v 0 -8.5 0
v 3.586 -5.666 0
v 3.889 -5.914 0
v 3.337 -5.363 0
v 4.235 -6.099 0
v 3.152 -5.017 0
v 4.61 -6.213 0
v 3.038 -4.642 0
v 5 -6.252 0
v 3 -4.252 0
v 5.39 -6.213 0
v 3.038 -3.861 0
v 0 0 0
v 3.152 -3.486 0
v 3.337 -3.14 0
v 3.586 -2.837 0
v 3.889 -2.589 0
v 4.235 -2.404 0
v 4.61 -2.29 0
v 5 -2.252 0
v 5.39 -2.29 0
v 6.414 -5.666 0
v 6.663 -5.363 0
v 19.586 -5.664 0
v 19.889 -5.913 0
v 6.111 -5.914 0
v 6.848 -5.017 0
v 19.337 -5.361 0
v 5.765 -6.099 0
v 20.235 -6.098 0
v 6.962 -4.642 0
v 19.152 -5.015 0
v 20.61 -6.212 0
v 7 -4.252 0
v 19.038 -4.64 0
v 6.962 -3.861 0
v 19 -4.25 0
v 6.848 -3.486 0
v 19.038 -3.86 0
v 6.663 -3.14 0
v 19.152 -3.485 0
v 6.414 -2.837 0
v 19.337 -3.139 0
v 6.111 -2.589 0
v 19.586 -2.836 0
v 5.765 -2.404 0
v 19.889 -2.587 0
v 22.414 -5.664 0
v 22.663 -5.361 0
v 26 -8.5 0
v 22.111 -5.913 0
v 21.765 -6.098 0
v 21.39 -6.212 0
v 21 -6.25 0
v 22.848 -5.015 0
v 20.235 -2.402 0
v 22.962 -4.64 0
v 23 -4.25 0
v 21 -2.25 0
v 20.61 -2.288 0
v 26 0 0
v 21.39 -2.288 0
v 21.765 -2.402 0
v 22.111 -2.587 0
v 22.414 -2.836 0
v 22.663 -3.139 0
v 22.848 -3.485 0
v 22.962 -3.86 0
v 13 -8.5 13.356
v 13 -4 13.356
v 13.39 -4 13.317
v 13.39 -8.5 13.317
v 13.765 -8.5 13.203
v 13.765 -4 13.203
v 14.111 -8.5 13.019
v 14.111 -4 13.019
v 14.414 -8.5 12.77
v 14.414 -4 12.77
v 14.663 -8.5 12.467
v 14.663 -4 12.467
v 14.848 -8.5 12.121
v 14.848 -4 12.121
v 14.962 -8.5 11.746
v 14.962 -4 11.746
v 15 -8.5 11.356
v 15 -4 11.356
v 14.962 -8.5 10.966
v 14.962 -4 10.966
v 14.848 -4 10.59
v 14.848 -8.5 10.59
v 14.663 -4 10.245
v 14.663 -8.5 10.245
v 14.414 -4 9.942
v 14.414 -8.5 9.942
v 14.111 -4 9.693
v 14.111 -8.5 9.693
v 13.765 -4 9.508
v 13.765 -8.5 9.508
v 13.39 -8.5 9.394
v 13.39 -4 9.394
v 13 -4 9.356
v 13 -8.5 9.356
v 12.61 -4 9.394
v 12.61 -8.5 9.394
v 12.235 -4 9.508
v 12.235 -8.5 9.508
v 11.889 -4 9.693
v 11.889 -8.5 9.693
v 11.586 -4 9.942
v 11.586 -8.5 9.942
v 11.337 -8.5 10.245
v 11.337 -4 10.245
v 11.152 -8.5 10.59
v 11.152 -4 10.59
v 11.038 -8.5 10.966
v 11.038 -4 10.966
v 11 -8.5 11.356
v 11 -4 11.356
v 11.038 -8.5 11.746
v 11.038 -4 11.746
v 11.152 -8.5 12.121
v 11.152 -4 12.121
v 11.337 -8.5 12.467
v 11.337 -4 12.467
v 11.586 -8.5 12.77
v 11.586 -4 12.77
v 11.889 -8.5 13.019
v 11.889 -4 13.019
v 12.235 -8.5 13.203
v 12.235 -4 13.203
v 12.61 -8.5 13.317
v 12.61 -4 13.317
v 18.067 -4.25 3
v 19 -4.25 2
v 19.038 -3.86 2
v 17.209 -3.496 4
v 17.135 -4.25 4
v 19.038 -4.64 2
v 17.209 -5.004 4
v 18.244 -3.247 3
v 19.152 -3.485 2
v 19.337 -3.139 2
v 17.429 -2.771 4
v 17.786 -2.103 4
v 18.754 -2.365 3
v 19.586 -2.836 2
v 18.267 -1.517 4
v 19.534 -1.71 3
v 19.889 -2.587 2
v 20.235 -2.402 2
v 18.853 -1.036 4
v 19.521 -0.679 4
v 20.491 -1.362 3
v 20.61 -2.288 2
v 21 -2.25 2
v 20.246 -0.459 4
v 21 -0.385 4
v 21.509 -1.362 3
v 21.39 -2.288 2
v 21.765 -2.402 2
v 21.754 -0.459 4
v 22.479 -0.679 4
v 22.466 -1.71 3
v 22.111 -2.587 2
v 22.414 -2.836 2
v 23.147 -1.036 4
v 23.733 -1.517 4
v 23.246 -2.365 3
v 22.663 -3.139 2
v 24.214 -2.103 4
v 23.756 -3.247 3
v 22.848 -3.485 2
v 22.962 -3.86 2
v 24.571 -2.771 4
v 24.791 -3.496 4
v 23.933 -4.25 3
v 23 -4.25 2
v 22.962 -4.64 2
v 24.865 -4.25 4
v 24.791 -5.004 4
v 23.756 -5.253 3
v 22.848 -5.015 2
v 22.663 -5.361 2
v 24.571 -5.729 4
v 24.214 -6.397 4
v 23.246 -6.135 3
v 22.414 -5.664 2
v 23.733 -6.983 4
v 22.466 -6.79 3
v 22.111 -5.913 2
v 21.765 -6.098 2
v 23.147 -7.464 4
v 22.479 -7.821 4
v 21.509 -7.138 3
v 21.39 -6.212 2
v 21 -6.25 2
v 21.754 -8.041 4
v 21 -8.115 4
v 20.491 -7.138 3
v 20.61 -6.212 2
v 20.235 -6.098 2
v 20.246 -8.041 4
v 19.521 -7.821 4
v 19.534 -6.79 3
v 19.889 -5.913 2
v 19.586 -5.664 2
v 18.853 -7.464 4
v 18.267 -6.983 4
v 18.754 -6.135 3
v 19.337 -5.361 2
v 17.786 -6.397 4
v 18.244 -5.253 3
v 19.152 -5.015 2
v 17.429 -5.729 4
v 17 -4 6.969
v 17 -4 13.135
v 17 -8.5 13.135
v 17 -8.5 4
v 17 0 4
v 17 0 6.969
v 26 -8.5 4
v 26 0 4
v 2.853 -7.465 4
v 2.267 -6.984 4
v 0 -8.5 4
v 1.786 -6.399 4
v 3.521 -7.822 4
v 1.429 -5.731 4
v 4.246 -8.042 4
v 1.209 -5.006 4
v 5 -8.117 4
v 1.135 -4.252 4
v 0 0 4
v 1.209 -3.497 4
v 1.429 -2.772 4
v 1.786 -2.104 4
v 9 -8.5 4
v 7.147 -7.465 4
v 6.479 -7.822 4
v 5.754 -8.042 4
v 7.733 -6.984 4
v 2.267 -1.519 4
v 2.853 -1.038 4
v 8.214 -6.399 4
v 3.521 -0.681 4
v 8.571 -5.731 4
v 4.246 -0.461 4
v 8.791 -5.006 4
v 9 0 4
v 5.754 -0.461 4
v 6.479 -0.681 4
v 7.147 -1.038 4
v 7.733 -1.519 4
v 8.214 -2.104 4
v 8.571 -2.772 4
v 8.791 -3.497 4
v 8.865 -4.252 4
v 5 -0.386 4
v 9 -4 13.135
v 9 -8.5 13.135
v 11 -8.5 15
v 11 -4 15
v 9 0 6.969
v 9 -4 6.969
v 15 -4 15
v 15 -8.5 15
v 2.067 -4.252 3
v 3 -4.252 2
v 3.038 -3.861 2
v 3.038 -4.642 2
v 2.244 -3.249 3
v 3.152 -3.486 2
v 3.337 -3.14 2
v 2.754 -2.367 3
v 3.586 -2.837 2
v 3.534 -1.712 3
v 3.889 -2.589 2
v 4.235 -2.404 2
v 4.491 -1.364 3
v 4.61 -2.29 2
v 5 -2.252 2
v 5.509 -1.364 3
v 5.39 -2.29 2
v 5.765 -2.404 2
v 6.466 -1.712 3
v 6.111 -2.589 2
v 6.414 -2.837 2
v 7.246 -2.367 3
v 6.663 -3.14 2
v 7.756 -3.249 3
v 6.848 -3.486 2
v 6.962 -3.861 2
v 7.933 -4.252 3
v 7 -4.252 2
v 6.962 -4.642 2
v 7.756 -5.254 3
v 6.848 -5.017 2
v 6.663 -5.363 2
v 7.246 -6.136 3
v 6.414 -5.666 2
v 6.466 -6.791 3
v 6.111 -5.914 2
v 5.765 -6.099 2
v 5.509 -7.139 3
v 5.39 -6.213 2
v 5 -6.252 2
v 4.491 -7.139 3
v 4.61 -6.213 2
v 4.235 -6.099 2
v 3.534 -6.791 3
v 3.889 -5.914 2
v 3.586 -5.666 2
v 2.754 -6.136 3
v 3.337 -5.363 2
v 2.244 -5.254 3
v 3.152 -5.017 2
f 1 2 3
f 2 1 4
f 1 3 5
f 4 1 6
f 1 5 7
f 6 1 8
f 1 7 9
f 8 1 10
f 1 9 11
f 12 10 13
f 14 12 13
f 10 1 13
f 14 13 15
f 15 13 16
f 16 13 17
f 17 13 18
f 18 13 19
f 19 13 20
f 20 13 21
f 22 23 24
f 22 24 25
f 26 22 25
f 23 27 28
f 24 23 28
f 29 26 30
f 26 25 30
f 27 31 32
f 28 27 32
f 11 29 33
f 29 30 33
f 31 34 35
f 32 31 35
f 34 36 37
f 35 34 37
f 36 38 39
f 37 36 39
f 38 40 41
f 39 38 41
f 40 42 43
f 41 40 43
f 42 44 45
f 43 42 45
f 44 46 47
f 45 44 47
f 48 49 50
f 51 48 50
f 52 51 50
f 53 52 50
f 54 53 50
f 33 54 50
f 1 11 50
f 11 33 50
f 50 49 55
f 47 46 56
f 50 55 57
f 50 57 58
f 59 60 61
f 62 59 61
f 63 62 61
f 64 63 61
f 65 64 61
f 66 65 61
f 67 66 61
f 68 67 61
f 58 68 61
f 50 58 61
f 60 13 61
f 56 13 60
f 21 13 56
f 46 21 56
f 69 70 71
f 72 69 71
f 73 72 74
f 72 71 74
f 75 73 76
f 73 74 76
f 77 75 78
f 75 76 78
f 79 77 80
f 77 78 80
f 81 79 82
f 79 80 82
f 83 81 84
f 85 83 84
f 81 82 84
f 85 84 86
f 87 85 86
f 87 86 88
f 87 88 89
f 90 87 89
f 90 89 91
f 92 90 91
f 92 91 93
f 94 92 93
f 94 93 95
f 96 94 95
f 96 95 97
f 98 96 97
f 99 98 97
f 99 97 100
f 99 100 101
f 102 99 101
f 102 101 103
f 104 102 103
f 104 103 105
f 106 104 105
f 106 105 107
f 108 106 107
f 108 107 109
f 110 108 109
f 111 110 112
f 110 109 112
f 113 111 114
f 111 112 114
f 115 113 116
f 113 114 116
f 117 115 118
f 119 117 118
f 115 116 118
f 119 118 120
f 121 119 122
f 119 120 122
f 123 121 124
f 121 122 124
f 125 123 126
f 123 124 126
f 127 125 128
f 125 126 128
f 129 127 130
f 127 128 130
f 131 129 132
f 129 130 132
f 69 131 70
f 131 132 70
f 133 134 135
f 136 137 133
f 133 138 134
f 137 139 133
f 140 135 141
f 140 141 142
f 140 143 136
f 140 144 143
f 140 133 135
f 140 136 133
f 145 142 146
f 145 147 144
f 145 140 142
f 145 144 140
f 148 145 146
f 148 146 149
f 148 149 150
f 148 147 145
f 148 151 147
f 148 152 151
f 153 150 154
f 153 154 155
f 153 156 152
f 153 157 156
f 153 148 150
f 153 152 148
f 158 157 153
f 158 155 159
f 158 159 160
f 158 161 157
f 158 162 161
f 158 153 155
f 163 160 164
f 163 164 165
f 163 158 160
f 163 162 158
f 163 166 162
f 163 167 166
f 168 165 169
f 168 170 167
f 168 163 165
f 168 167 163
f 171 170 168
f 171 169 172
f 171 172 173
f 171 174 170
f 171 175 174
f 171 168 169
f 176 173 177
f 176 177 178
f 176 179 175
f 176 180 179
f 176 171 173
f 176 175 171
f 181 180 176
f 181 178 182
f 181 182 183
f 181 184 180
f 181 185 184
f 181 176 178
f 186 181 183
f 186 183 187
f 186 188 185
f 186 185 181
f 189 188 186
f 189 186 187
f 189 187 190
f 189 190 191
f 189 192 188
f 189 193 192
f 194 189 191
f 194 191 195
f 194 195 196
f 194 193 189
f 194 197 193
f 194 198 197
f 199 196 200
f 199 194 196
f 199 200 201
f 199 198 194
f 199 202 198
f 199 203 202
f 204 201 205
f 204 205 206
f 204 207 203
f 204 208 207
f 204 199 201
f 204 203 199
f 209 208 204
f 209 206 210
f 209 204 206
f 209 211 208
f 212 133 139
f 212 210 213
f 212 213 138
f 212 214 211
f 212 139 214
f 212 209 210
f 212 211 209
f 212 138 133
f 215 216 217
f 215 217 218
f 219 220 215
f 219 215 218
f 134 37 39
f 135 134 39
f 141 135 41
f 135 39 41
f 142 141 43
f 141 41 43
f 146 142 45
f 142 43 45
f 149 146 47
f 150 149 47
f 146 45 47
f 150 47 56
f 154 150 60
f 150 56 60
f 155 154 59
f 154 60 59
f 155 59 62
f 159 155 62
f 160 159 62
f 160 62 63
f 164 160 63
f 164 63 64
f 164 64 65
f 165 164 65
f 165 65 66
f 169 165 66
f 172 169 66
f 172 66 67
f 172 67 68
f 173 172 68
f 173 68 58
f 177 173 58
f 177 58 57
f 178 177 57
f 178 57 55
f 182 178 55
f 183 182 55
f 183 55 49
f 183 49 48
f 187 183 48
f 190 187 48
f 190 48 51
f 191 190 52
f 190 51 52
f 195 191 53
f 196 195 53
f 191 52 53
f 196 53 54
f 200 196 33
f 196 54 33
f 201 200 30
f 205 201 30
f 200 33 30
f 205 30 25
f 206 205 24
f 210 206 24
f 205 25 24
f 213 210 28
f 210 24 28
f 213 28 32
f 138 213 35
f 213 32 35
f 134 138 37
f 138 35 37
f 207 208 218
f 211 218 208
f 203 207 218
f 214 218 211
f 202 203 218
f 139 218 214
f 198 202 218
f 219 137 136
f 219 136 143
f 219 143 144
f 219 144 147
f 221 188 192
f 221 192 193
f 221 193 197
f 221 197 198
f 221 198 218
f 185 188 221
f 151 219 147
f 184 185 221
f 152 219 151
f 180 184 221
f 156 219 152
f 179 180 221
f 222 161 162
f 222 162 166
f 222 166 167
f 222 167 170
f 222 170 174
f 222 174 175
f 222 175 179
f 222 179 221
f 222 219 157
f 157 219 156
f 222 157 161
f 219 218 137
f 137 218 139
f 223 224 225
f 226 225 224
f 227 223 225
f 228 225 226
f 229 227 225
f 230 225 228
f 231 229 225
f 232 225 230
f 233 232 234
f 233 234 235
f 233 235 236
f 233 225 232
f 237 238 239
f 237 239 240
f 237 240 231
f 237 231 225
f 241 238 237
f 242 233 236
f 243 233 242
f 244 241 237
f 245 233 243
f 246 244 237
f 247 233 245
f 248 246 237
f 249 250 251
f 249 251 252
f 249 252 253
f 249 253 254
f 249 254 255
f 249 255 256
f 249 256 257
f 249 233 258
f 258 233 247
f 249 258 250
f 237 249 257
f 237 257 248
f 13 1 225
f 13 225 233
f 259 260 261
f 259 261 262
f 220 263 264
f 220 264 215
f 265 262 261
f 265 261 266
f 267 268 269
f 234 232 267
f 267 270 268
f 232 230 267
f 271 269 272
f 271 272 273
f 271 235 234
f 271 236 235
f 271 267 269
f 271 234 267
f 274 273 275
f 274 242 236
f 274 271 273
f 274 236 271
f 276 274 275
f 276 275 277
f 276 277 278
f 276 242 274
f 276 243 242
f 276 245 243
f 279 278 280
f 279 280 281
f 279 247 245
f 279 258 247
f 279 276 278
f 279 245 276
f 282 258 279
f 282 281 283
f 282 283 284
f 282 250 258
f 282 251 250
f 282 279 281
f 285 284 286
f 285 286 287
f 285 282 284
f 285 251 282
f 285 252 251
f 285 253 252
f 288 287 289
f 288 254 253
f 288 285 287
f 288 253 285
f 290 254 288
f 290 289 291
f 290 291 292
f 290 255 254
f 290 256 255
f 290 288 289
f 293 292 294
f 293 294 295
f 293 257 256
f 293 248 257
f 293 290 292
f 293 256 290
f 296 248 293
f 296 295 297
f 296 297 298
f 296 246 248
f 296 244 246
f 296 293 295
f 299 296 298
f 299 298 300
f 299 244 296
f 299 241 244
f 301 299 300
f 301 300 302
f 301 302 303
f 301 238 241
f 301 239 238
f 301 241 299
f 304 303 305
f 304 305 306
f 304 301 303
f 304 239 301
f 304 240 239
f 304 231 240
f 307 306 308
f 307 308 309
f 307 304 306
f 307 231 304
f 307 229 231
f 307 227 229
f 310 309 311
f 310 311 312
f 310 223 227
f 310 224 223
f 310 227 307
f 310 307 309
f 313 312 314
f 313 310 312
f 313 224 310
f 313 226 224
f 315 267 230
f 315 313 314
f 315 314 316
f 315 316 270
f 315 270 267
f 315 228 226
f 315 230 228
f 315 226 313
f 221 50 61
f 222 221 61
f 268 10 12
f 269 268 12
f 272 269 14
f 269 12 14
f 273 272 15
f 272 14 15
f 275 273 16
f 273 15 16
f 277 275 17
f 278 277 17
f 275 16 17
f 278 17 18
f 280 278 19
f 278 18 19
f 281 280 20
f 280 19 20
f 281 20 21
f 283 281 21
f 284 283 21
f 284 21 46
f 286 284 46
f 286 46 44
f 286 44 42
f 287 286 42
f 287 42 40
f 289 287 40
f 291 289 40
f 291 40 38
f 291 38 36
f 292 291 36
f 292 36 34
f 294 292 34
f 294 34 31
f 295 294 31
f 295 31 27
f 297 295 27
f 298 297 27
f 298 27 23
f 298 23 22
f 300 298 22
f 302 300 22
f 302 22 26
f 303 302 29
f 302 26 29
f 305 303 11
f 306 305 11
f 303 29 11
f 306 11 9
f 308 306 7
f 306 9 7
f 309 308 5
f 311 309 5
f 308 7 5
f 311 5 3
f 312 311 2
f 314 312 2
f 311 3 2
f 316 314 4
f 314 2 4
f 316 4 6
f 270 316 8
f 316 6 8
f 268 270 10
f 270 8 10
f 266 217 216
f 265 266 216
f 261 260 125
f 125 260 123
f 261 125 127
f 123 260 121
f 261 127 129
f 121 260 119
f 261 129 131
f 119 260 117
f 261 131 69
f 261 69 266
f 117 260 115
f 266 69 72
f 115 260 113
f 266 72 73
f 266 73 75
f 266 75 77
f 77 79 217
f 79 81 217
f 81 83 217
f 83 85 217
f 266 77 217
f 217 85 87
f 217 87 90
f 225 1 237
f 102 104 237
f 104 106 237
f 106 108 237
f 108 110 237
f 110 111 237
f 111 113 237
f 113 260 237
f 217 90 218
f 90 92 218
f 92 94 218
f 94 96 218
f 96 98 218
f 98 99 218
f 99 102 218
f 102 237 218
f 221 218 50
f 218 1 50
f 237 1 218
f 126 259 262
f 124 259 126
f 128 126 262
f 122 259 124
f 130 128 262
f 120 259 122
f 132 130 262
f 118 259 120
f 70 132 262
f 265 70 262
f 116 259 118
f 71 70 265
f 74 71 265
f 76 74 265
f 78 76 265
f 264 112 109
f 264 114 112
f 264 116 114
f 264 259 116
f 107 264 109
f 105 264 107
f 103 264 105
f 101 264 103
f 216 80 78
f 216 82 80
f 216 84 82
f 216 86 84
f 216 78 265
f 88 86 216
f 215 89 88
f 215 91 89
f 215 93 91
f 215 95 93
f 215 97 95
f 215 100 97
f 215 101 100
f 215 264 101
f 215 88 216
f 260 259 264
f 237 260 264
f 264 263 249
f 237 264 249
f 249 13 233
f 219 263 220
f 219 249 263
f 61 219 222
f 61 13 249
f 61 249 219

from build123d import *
from OCP.BRepFilletAPI import BRepFilletAPI_MakeChamfer

# Parameters (mm, degrees)
SKETCH_1_W            = 26
SKETCH_1_H            = 8.5
EXTRUDE_1_DEPTH       = 15
SKETCH_2_W            = 9
SKETCH_2_H            = 17.151512959
CUT_EXTRUDE_2_DEPTH   = 20
CHAMFER_1_SIZE        = 2
CHAMFER_1_SIZE2       = 1.865030172
SKETCH_3_R            = 2
CUT_EXTRUDE_1_DEPTH   = 32.19695498
CHAMFER_2_SIZE        = 2
CHAMFER_2_SIZE2       = 1.865030172
SKETCH_4_W            = 11.3471837
SKETCH_4_H            = 8.882896331
CUT_EXTRUDE_2_2_DEPTH = 4
SKETCH_5_R            = 2
CUT_EXTRUDE_3_DEPTH   = 31.352100422


with BuildPart() as part:
    # Эскиз1 → Вытянуть1 (new body)
    with BuildSketch(Plane.XY):
        with Locations((13, -4.25)):
            Rectangle(SKETCH_1_W, SKETCH_1_H)
    extrude(amount=EXTRUDE_1_DEPTH)

    # Эскиз2 → Cut-Extrude 2 (cut)
    with BuildSketch(Plane(origin=(0, 0, 0), x_dir=(1, 0, 0), z_dir=(0, 1, 0))):
        with Locations((4.5, -12.57575648)):
            Rectangle(SKETCH_2_W, SKETCH_2_H)
        with Locations((21.5, -12.57575648)):
            Rectangle(SKETCH_2_W, SKETCH_2_H)
    extrude(amount=-CUT_EXTRUDE_2_DEPTH, mode=Mode.SUBTRACT)

    # Фаска1
    chamfer_1_edges = [part.edges().sort_by_distance(p)[0] for p in [
        (9, -4.25, 15),
        (17, -4.25, 15),
    ]]
    chamfer_1_side = [part.faces().sort_by_distance(p)[0] for p in [
        (13, -4.25, 15),
    ]]
    chamfer(chamfer_1_edges, length=CHAMFER_1_SIZE, length2=CHAMFER_1_SIZE2, reference=chamfer_1_side[0])

    # Эскиз3 → Вырез-Вытянуть1 (cut, through all)
    with BuildSketch(Plane(origin=(0, 0, 0), x_dir=(-1, 0, 0), z_dir=(0, 0, -1))):
        with Locations((-21, -4.250000001)):
            Circle(SKETCH_3_R)
        with Locations((-5, -4.251501777)):
            Circle(SKETCH_3_R)
    extrude(amount=-CUT_EXTRUDE_1_DEPTH, mode=Mode.SUBTRACT)

    # Фаска2: one chamfer whose edges measure the first distance from different faces: ONE call of the kernel's chamfer builder (chamfer() names one face for all edges)
    chamfer_2_edges_1 = [part.edges().sort_by_distance(p)[0] for p in [
        (23, -4.250000001, 4),
    ]]
    chamfer_2_side_1 = [part.faces().sort_by_distance(p)[0] for p in [
        (23, -4.250000001, 2),
    ]]
    chamfer_2_edges_2 = [part.edges().sort_by_distance(p)[0] for p in [
        (7, -4.251501777, 4),
    ]]
    chamfer_2_side_2 = [part.faces().sort_by_distance(p)[0] for p in [
        (7, -4.251501777, 2),
    ]]
    chamfer_2 = BRepFilletAPI_MakeChamfer(part.part.solid().wrapped)
    for e in chamfer_2_edges_1:
        chamfer_2.Add(CHAMFER_2_SIZE, CHAMFER_2_SIZE2, e.wrapped, chamfer_2_side_1[0].wrapped)  # the first distance lies on this face
    for e in chamfer_2_edges_2:
        chamfer_2.Add(CHAMFER_2_SIZE, CHAMFER_2_SIZE2, e.wrapped, chamfer_2_side_2[0].wrapped)  # the first distance lies on this face
    add(Compound.cast(chamfer_2.Shape()), mode=Mode.REPLACE)

    # Эскиз4 → Cut-Extrude 2 2 (cut)
    with BuildSketch(Plane(origin=(0, 0, 0), x_dir=(1, 0, 0), z_dir=(0, 1, 0))):
        with Locations((13.06322118, -11.410294164)):
            Rectangle(SKETCH_4_W, SKETCH_4_H)
    extrude(amount=-CUT_EXTRUDE_2_2_DEPTH, mode=Mode.SUBTRACT)

    # Эскиз5 → Вырез-Вытянуть3 (cut, through all)
    with BuildSketch(Plane(origin=(0, -4, 0), x_dir=(1, 0, 0), z_dir=(0, 1, 0))):
        with Locations(Location((13, -11.355717768, 0), (0, 0, 270))):
            Circle(SKETCH_5_R)
    extrude(amount=-CUT_EXTRUDE_3_DEPTH, mode=Mode.SUBTRACT)


solid = part.part
